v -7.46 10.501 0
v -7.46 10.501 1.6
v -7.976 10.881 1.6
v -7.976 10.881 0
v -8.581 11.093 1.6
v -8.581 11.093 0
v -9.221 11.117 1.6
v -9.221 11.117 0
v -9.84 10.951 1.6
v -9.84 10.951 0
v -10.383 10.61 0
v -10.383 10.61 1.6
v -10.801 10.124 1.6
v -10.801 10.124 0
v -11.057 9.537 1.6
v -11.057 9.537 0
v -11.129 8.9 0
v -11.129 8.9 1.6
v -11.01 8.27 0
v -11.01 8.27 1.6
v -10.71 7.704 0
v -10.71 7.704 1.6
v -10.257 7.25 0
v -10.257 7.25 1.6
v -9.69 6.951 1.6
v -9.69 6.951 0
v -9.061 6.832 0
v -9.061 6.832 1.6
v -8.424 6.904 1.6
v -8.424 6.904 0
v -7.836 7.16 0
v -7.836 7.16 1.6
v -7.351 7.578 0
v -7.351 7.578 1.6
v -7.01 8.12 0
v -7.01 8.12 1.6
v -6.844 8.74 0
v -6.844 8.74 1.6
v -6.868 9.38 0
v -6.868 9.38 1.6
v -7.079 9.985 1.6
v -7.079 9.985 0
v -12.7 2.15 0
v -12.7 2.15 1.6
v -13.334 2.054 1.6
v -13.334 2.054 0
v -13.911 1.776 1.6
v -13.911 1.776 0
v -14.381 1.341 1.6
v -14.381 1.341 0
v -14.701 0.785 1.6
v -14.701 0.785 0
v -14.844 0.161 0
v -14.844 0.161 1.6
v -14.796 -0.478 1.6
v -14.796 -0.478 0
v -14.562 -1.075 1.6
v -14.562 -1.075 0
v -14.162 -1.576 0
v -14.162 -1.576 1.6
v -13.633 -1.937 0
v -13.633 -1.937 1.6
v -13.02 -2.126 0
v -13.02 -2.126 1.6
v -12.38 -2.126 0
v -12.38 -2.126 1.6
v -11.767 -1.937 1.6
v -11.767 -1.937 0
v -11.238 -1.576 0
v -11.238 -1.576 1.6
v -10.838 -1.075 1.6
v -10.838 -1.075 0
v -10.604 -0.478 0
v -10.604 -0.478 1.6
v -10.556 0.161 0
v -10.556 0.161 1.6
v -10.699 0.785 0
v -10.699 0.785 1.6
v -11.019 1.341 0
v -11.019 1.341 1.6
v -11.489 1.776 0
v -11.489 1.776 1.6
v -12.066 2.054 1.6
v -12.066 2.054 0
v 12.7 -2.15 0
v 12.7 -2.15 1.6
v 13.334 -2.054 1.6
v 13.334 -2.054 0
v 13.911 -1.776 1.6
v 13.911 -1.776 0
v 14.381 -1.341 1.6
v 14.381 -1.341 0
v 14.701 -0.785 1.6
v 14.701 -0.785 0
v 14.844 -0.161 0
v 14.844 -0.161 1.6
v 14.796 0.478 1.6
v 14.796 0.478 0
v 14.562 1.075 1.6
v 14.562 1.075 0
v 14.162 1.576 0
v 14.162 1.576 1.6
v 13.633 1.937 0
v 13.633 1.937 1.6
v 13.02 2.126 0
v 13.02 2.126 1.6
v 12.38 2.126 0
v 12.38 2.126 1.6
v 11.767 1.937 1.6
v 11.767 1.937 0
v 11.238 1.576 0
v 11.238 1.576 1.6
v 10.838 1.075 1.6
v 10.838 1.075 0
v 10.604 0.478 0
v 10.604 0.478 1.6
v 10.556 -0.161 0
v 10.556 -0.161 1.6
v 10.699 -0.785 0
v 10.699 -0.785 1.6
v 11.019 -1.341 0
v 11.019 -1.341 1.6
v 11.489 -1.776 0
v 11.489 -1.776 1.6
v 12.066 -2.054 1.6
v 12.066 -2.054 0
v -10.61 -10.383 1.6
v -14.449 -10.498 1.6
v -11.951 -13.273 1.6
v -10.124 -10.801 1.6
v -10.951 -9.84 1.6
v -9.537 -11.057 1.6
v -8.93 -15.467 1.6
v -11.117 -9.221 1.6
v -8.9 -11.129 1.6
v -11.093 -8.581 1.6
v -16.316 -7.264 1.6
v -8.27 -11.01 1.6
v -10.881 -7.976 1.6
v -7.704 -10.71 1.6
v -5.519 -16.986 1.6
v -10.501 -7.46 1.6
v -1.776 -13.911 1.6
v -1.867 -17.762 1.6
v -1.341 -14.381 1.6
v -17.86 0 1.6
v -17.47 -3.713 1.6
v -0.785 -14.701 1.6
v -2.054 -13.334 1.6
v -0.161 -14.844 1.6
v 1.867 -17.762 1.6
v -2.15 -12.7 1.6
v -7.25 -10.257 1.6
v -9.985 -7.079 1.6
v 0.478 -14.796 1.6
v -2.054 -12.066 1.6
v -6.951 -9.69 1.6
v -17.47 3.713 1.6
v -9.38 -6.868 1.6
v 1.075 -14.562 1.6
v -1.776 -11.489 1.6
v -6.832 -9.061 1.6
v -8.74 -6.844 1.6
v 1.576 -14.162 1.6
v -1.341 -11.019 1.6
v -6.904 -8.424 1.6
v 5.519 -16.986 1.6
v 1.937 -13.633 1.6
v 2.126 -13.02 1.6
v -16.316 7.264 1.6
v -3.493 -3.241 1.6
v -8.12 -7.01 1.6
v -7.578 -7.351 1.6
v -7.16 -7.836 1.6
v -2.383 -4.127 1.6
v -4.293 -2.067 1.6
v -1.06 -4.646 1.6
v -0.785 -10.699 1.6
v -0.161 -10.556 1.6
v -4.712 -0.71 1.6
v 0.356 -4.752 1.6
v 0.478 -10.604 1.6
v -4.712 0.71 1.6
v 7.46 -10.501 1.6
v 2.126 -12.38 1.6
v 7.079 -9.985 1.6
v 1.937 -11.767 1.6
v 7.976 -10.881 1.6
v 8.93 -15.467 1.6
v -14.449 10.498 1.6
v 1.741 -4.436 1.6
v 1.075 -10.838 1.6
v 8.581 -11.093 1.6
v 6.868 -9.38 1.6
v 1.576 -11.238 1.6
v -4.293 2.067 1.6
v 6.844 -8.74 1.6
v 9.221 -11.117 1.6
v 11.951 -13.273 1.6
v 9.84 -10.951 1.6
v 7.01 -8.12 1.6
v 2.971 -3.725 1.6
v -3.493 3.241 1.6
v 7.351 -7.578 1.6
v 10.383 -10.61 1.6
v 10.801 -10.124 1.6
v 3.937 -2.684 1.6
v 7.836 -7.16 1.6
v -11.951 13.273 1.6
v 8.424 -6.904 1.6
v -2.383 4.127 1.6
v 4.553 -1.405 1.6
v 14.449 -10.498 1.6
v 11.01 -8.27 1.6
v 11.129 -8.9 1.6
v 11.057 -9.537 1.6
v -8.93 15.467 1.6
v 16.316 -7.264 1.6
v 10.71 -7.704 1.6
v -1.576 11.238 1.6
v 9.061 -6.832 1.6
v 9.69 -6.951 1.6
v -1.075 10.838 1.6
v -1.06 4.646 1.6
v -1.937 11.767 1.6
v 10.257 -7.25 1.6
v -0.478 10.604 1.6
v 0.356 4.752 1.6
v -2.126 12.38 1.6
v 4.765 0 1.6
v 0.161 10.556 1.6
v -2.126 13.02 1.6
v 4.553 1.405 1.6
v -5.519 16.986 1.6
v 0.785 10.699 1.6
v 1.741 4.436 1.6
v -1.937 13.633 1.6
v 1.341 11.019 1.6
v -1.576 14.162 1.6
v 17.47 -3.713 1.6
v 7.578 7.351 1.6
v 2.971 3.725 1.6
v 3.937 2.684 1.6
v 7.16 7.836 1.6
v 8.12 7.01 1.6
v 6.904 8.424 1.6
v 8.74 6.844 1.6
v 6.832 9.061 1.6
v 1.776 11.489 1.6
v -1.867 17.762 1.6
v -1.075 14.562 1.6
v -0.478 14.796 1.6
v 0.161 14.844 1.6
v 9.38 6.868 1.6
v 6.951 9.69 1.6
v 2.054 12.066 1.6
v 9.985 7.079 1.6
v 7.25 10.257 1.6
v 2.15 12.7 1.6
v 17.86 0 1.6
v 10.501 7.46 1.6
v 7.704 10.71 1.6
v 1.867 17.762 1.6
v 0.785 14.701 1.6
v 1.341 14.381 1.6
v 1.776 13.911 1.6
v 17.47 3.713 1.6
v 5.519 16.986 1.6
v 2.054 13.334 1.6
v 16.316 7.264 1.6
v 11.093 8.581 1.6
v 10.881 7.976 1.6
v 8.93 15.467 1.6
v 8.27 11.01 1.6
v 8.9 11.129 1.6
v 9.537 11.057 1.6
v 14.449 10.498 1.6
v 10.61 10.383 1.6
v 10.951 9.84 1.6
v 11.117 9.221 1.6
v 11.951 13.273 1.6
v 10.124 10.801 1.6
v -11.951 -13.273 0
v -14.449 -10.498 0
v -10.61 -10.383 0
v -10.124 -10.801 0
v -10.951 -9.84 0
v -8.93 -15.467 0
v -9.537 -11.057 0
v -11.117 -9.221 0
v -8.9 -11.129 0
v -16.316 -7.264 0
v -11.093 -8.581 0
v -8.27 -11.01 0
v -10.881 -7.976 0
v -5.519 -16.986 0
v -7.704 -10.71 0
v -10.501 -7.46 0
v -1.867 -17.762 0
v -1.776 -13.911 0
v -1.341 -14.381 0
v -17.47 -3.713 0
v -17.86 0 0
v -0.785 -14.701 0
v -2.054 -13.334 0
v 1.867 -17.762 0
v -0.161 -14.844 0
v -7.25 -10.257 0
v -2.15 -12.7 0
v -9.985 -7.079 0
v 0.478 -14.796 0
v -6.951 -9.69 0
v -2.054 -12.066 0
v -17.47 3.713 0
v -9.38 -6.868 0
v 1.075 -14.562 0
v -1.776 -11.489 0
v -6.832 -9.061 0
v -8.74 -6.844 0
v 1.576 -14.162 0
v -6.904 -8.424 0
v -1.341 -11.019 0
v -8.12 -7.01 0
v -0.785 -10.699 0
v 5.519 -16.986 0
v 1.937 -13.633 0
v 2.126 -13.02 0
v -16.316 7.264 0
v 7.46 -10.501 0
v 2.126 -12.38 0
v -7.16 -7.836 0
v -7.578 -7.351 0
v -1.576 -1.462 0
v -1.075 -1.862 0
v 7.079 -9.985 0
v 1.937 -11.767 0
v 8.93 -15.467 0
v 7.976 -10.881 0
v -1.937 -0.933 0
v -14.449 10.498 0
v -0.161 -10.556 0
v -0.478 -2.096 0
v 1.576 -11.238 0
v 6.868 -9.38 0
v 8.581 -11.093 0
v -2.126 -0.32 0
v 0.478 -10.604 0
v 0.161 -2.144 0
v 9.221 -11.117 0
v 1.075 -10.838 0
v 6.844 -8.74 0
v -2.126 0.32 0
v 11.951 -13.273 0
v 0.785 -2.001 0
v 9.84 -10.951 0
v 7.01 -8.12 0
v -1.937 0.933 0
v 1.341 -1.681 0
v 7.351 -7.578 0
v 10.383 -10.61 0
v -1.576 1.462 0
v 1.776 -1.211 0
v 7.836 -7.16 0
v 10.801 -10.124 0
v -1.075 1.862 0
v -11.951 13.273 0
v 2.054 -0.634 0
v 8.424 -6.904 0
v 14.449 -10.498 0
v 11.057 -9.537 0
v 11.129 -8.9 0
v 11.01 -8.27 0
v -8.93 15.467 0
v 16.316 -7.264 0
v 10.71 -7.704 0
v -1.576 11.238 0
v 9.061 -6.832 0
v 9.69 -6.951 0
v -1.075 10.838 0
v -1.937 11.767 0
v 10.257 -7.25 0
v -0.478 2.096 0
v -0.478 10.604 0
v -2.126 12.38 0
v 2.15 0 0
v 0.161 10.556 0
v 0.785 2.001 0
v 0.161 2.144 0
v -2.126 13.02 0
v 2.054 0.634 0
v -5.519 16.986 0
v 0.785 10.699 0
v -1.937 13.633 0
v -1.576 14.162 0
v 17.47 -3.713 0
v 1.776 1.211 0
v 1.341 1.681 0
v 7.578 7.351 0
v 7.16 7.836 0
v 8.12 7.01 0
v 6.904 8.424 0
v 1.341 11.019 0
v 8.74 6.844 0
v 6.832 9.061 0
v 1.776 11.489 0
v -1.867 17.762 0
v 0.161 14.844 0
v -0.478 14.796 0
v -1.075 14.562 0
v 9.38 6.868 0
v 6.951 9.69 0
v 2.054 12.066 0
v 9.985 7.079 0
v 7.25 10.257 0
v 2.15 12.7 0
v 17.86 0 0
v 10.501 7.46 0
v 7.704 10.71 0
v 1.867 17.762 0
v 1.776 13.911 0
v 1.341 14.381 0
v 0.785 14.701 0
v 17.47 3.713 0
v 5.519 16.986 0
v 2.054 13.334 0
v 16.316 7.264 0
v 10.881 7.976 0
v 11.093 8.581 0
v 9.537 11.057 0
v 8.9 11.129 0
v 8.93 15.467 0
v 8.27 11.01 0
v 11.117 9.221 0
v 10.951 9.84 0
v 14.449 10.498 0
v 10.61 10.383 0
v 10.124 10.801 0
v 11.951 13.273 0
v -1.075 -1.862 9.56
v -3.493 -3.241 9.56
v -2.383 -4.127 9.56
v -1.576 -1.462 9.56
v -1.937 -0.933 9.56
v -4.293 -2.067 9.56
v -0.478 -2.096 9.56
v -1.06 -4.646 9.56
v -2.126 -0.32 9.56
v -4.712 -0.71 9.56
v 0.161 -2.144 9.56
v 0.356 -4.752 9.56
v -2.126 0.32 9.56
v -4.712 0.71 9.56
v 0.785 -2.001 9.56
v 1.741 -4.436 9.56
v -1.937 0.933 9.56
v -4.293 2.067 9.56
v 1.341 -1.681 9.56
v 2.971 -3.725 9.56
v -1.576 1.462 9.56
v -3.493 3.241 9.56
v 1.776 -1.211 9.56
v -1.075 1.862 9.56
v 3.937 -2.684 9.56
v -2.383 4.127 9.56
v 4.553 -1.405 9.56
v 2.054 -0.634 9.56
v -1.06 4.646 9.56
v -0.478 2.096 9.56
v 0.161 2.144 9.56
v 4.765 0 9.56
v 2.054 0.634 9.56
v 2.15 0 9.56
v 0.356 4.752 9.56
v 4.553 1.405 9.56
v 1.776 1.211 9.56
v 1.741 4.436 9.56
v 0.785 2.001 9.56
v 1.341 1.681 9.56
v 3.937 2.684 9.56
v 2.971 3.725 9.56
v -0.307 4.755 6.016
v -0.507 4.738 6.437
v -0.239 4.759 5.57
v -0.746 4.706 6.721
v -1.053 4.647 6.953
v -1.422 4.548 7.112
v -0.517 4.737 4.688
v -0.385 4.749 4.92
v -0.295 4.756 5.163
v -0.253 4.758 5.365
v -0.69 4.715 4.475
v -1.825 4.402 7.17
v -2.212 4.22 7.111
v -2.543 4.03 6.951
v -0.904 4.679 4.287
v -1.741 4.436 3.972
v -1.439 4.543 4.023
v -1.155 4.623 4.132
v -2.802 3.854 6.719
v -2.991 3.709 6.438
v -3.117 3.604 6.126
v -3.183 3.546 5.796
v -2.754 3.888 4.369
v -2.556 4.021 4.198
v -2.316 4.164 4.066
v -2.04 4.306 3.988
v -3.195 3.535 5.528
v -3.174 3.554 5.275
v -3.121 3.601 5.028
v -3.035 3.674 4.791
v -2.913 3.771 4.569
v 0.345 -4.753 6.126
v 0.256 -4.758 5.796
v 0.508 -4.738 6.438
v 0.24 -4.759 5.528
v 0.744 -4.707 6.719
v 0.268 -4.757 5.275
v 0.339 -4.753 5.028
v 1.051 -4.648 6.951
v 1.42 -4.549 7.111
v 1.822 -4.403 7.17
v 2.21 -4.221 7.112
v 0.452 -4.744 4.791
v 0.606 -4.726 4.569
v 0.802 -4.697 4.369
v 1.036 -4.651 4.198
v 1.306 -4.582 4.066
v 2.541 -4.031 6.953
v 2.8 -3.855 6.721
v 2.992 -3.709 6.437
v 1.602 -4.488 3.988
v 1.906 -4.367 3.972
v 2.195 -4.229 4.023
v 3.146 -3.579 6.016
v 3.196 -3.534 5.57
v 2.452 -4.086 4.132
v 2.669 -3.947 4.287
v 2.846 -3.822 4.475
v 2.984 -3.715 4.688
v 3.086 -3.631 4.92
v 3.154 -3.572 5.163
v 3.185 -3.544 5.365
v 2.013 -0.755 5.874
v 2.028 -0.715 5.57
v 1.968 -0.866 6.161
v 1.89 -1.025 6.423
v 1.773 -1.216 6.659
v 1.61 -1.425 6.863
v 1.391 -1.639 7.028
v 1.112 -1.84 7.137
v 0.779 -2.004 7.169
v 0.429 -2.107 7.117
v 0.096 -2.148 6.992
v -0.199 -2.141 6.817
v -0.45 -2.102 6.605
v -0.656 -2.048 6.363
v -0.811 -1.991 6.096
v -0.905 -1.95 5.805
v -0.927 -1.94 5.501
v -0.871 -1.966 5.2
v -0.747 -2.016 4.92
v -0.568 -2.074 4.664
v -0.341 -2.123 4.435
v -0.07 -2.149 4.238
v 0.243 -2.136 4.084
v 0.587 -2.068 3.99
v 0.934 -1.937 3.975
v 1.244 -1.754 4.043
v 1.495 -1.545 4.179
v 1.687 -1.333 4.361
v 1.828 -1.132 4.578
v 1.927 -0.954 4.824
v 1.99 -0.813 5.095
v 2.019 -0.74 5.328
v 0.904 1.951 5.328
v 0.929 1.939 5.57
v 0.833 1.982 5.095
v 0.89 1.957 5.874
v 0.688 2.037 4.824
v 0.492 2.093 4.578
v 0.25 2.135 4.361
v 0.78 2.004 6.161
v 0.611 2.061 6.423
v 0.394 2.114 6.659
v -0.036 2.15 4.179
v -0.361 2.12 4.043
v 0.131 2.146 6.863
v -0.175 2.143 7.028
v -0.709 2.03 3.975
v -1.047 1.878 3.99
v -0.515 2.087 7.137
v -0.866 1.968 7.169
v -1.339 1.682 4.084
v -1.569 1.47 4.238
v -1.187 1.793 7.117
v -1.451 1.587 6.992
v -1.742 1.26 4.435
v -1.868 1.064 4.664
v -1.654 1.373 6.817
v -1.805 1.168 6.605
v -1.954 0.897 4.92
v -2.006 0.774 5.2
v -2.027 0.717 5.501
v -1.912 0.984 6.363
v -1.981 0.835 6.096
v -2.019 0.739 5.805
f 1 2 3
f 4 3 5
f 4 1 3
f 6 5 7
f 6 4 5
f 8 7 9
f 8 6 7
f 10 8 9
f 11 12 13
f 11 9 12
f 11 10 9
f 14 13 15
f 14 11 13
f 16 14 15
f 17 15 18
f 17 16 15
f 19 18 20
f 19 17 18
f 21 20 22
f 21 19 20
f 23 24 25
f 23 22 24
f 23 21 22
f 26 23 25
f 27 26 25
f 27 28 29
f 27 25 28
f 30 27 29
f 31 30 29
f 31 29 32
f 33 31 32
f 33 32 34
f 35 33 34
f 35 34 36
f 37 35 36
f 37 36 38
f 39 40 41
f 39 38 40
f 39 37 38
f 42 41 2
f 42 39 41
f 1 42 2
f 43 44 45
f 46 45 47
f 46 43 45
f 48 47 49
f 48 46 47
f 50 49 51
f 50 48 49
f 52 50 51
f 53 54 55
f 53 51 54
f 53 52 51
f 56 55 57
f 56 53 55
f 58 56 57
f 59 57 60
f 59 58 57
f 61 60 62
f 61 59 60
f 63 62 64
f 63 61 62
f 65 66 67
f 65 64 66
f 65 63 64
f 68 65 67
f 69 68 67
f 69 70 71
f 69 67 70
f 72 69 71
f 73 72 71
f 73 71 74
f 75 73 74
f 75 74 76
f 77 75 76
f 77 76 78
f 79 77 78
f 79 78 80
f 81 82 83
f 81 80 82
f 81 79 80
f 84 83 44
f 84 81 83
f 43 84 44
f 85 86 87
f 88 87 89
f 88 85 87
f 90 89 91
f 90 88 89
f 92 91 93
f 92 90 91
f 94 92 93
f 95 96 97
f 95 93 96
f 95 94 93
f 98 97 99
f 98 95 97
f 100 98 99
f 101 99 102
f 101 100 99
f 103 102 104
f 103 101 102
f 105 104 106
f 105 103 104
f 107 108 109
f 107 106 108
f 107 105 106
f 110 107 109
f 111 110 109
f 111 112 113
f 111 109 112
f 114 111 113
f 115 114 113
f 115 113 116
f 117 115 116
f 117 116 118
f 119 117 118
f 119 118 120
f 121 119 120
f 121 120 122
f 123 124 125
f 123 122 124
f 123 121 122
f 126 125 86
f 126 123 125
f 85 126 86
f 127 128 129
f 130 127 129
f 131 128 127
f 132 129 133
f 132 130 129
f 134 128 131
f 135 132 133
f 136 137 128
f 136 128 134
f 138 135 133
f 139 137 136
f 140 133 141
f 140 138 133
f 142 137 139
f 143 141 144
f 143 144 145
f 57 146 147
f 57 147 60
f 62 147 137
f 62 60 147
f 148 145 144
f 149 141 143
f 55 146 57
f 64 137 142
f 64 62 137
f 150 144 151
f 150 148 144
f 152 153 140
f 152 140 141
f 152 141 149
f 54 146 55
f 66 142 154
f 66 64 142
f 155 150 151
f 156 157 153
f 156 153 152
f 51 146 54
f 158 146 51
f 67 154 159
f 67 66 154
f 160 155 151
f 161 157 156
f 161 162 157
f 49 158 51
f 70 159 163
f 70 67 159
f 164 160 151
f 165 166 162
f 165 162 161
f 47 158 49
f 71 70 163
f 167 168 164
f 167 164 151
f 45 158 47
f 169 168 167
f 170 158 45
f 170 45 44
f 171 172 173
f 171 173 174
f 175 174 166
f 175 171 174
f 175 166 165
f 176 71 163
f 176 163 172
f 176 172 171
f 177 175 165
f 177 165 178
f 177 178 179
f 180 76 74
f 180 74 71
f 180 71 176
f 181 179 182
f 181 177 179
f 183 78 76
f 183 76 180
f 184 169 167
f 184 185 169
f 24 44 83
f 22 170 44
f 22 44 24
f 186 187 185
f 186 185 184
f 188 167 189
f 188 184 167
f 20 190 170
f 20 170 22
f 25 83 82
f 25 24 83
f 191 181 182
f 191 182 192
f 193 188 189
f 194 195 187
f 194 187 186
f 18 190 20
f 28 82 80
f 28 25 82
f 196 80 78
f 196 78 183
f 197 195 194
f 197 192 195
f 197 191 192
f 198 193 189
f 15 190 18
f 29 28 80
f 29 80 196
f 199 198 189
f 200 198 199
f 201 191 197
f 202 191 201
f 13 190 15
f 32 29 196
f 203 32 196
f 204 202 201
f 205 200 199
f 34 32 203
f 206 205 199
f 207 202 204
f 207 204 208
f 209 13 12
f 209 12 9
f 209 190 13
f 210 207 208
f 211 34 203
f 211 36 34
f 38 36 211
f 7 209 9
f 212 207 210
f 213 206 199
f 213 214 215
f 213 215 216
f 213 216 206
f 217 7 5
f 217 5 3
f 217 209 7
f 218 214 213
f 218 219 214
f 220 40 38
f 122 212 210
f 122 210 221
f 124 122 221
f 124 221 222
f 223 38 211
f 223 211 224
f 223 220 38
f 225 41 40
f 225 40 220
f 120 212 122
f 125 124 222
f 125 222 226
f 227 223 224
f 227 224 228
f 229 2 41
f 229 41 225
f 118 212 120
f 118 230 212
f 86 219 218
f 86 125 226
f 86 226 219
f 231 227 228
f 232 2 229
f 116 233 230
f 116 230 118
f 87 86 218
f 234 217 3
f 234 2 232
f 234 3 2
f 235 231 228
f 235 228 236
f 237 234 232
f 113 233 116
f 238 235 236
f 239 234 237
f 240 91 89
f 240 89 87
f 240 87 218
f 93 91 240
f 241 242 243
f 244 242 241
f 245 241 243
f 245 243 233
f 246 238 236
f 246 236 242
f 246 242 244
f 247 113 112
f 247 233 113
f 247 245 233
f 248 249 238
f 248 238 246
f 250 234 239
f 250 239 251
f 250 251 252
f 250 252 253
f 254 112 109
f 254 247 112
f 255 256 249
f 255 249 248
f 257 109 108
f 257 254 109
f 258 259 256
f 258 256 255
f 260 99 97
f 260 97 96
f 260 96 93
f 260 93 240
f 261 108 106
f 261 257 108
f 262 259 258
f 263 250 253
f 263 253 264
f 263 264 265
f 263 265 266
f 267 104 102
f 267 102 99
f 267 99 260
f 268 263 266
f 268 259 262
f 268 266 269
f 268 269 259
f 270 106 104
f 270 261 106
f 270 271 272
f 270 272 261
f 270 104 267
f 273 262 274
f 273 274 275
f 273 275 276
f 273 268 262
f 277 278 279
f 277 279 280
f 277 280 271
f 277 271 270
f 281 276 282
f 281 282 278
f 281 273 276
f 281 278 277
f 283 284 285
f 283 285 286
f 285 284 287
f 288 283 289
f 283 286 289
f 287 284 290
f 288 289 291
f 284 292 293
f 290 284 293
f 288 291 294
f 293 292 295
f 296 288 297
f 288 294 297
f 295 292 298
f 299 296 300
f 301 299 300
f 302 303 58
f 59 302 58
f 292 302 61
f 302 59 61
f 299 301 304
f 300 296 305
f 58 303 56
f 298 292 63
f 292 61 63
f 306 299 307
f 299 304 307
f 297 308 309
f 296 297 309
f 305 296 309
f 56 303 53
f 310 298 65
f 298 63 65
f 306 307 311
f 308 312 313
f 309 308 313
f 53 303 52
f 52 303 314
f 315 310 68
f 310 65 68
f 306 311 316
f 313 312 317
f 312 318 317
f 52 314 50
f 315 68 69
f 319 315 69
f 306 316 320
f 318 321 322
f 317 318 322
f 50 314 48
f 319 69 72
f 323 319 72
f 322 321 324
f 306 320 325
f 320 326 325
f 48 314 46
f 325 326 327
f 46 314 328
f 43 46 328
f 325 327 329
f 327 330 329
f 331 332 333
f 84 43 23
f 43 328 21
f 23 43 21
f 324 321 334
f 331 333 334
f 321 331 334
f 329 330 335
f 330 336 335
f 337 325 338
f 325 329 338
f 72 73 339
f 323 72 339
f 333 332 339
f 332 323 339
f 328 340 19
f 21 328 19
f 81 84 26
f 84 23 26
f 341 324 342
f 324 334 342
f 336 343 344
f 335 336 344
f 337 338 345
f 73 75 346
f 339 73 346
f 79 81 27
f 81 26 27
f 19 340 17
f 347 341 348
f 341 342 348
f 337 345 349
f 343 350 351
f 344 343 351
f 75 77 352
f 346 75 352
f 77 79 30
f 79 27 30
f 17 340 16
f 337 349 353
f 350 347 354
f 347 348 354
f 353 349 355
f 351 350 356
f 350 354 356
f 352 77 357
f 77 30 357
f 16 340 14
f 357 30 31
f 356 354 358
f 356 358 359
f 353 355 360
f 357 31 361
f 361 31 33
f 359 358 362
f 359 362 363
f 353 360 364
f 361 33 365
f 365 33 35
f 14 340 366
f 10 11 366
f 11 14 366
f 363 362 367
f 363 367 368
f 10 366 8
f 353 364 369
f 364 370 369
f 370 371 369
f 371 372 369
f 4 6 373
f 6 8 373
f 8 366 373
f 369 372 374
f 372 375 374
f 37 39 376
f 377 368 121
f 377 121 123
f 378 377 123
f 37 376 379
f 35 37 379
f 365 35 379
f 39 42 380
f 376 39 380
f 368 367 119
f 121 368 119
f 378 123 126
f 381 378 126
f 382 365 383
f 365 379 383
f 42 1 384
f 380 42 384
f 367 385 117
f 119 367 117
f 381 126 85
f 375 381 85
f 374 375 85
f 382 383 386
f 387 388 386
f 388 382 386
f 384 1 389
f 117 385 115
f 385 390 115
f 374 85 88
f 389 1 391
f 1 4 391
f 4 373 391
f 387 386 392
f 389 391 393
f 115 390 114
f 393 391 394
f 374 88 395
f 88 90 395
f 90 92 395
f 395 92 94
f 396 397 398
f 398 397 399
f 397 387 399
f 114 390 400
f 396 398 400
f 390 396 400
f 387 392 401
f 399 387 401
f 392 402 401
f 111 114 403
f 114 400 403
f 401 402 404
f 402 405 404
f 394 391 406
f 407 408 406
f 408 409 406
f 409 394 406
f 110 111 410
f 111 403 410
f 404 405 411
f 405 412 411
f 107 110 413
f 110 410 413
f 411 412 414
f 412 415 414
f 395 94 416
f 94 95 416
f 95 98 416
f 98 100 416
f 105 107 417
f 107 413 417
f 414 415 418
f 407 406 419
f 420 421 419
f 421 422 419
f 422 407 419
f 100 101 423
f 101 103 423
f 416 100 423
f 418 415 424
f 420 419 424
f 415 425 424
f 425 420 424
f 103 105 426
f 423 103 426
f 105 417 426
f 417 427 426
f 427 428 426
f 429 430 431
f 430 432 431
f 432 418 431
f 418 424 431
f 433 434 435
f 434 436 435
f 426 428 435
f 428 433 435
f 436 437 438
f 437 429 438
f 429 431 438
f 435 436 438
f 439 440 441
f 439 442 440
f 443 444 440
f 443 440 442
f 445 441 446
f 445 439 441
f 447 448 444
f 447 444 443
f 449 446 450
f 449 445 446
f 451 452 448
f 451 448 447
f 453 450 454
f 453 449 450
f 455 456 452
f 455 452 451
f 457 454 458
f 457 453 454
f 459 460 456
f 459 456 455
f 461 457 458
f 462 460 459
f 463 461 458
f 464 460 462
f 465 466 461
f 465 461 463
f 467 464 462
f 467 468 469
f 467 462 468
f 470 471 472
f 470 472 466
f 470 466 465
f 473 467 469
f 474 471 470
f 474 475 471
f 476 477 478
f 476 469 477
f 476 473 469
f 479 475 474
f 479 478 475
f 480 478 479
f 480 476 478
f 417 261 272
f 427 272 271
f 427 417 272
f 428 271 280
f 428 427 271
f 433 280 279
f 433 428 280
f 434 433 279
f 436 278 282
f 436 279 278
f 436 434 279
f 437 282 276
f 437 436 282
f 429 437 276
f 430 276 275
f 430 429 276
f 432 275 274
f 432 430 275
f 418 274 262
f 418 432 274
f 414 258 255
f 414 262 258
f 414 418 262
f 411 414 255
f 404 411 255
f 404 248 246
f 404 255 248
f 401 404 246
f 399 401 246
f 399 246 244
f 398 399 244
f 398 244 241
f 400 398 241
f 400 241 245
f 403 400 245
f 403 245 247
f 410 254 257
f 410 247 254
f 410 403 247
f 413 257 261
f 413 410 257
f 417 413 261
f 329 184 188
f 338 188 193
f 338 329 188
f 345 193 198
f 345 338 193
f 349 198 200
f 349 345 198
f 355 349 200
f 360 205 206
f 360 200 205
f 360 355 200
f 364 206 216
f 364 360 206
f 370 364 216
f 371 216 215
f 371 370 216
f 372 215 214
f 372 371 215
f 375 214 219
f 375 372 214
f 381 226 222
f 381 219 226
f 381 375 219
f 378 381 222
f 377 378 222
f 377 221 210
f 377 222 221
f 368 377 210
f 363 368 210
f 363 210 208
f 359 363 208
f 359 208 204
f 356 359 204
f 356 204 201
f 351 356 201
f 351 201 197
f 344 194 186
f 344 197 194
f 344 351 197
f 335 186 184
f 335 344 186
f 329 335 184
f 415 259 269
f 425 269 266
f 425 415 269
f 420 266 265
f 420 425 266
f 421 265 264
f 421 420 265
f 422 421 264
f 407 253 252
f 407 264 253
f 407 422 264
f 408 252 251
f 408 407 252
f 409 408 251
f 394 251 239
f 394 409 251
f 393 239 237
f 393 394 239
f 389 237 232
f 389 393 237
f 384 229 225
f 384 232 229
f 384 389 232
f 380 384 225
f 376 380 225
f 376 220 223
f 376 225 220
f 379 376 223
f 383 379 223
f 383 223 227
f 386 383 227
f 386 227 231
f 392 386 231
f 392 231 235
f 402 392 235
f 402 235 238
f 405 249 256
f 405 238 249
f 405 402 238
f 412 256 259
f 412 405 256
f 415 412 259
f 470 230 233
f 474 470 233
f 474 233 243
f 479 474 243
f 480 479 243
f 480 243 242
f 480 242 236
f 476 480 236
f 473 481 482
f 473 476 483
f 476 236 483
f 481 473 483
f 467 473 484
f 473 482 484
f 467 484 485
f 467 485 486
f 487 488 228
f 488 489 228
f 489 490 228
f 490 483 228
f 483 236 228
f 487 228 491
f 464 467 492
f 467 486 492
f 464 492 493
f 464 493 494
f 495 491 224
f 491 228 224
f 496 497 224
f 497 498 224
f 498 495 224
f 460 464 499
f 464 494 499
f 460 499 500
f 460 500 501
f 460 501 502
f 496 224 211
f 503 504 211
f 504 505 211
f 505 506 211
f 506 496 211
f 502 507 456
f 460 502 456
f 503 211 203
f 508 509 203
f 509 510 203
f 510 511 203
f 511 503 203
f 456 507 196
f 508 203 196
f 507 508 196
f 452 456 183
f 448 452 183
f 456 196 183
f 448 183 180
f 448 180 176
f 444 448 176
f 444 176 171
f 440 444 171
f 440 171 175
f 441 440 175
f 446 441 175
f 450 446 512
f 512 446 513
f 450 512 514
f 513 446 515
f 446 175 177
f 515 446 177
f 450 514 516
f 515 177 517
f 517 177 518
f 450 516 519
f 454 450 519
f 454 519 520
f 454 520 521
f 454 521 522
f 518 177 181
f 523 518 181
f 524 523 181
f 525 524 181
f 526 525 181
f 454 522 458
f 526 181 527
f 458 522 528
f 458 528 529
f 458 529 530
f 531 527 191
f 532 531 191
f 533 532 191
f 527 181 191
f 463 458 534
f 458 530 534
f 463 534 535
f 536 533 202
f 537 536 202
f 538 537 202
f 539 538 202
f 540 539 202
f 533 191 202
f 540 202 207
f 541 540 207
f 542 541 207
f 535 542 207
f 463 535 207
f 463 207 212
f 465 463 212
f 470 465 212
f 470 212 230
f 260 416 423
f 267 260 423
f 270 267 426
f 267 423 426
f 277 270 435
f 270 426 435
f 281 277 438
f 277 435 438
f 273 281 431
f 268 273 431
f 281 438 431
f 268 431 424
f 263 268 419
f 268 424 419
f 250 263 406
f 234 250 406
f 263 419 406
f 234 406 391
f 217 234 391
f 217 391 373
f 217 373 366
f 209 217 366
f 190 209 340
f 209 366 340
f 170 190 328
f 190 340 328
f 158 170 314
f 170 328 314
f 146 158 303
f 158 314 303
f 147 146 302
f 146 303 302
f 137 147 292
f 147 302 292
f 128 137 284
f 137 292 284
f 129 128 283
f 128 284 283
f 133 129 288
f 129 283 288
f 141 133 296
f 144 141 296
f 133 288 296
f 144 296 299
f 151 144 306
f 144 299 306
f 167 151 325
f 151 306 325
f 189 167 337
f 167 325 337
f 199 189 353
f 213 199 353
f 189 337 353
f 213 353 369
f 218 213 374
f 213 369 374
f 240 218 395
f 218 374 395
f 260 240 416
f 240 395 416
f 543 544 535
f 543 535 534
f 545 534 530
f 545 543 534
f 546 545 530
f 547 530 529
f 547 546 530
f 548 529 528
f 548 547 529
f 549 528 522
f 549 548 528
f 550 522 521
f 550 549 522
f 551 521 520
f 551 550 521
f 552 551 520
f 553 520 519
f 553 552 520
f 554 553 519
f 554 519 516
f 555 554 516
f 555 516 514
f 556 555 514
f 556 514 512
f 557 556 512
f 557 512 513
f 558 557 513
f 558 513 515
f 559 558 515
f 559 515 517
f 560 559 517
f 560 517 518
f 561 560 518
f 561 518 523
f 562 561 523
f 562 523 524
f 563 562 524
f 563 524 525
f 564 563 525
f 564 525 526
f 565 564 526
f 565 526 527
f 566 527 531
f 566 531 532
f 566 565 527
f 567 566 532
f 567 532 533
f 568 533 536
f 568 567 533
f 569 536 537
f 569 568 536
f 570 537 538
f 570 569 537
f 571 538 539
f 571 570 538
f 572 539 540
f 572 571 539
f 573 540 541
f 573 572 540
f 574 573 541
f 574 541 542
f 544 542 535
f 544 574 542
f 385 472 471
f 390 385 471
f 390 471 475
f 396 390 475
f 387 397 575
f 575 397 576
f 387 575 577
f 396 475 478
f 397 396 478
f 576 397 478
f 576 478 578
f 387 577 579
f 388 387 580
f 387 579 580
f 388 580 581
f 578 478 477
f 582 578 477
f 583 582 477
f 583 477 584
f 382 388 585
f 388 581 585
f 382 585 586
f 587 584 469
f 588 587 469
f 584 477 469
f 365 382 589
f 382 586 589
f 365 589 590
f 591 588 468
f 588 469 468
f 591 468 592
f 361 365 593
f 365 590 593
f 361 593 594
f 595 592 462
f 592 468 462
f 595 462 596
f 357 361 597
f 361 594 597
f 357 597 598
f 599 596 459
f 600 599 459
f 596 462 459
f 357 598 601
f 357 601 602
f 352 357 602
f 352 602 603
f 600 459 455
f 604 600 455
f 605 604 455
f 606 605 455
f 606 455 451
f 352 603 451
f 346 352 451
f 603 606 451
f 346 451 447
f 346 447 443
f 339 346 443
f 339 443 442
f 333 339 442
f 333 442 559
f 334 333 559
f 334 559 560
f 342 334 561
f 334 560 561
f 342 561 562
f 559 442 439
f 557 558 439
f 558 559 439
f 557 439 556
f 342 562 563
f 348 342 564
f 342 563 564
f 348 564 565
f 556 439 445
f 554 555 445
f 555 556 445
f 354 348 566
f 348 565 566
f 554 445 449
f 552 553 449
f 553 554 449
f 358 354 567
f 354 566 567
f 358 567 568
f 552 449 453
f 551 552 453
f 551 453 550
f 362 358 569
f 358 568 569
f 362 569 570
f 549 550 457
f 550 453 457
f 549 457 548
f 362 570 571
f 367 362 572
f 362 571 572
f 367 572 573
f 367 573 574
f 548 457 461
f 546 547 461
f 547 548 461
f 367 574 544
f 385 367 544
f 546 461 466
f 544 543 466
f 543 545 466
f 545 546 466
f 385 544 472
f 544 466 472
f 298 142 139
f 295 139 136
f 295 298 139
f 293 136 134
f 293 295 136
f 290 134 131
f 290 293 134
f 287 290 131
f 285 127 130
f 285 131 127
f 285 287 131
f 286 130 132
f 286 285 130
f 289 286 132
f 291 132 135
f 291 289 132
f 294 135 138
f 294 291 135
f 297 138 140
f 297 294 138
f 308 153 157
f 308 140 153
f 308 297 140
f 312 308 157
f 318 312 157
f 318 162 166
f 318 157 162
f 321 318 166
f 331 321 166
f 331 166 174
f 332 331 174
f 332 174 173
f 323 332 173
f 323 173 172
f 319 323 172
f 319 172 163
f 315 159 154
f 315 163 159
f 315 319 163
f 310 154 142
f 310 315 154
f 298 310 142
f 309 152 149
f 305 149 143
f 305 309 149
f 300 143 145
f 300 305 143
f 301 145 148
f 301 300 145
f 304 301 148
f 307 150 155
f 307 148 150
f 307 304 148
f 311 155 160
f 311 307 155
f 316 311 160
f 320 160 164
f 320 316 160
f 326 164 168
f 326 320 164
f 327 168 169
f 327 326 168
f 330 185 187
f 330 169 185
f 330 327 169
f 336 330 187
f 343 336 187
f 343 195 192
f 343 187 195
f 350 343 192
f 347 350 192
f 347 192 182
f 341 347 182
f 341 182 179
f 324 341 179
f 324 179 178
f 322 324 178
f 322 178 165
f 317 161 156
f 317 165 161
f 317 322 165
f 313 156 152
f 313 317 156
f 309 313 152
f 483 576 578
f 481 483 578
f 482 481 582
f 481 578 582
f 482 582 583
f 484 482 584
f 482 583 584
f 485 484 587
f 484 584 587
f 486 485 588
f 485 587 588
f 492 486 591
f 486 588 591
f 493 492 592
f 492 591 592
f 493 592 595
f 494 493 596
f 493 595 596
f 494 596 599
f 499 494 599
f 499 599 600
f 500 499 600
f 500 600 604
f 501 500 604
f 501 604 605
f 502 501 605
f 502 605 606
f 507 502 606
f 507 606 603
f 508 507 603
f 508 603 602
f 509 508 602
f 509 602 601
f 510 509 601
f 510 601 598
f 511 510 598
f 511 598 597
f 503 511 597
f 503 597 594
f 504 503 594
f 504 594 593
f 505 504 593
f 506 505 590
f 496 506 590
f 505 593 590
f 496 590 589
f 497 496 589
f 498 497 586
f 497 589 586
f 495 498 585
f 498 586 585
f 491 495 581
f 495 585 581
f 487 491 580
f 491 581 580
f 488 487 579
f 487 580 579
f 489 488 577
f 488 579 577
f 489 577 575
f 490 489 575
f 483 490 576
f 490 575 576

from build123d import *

# Parameters (mm, degrees)
SKETCH_R             = 17.86
PAD_DEPTH            = 1.6
SKETCH001_R          = 4.765
PAD001_DEPTH         = 7.96
SKETCH002_R          = 2.15
POCKET_DEPTH         = 9.561
SKETCH003_R          = 1.6
POCKET001_DEPTH      = 5
POCKET001_DEPTH_BACK = -5
SKETCH004_R          = 2.15
POCKET002_DEPTH      = 112.385713
POLARPATTERN_COUNT   = 8


with BuildPart() as part:
    # Sketch → Pad (new body)
    with BuildSketch(Plane.XY):
        Circle(SKETCH_R)
    extrude(amount=PAD_DEPTH)

    # Sketch001 (on Face3 of Pad) → Pad001 (join)
    with BuildSketch(Plane.XY.offset(1.6)):
        Circle(SKETCH001_R)
    extrude(amount=PAD001_DEPTH)

    # Sketch002 (on Face5 of Pad001) → Pocket (cut, through all)
    with BuildSketch(Plane.XY.offset(9.56)):
        Circle(SKETCH002_R)
    extrude(amount=-POCKET_DEPTH, mode=Mode.SUBTRACT)

    # Sketch003 (on DatumPlane) → Pocket001 (cut, two sides)
    with BuildSketch(Plane(origin=(0, 0, 0), x_dir=(0.92388, 0.382683, 0), z_dir=(0.382683, -0.92388, 0))) as pocket001_sk:
        with Locations((0, 5.57)):
            Circle(SKETCH003_R)
    extrude(amount=-POCKET001_DEPTH, mode=Mode.SUBTRACT)
    extrude(pocket001_sk.sketch, amount=-POCKET001_DEPTH_BACK, mode=Mode.SUBTRACT)

    # Sketch004 → Pocket002 (cut, through all)
    with BuildSketch(Plane.XY):
        with Locations((0, 12.7)):
            Circle(SKETCH004_R)
    pocket002 = extrude(amount=POCKET002_DEPTH, mode=Mode.SUBTRACT)

    # PolarPattern: Pocket002 ×8 about axis
    polarpattern_axis = Axis((0, 0, 0), (0, 0, 1))
    for i in range(1, POLARPATTERN_COUNT):
        add(pocket002.rotate(polarpattern_axis, i * 360 / POLARPATTERN_COUNT), mode=Mode.SUBTRACT)


solid = part.part
